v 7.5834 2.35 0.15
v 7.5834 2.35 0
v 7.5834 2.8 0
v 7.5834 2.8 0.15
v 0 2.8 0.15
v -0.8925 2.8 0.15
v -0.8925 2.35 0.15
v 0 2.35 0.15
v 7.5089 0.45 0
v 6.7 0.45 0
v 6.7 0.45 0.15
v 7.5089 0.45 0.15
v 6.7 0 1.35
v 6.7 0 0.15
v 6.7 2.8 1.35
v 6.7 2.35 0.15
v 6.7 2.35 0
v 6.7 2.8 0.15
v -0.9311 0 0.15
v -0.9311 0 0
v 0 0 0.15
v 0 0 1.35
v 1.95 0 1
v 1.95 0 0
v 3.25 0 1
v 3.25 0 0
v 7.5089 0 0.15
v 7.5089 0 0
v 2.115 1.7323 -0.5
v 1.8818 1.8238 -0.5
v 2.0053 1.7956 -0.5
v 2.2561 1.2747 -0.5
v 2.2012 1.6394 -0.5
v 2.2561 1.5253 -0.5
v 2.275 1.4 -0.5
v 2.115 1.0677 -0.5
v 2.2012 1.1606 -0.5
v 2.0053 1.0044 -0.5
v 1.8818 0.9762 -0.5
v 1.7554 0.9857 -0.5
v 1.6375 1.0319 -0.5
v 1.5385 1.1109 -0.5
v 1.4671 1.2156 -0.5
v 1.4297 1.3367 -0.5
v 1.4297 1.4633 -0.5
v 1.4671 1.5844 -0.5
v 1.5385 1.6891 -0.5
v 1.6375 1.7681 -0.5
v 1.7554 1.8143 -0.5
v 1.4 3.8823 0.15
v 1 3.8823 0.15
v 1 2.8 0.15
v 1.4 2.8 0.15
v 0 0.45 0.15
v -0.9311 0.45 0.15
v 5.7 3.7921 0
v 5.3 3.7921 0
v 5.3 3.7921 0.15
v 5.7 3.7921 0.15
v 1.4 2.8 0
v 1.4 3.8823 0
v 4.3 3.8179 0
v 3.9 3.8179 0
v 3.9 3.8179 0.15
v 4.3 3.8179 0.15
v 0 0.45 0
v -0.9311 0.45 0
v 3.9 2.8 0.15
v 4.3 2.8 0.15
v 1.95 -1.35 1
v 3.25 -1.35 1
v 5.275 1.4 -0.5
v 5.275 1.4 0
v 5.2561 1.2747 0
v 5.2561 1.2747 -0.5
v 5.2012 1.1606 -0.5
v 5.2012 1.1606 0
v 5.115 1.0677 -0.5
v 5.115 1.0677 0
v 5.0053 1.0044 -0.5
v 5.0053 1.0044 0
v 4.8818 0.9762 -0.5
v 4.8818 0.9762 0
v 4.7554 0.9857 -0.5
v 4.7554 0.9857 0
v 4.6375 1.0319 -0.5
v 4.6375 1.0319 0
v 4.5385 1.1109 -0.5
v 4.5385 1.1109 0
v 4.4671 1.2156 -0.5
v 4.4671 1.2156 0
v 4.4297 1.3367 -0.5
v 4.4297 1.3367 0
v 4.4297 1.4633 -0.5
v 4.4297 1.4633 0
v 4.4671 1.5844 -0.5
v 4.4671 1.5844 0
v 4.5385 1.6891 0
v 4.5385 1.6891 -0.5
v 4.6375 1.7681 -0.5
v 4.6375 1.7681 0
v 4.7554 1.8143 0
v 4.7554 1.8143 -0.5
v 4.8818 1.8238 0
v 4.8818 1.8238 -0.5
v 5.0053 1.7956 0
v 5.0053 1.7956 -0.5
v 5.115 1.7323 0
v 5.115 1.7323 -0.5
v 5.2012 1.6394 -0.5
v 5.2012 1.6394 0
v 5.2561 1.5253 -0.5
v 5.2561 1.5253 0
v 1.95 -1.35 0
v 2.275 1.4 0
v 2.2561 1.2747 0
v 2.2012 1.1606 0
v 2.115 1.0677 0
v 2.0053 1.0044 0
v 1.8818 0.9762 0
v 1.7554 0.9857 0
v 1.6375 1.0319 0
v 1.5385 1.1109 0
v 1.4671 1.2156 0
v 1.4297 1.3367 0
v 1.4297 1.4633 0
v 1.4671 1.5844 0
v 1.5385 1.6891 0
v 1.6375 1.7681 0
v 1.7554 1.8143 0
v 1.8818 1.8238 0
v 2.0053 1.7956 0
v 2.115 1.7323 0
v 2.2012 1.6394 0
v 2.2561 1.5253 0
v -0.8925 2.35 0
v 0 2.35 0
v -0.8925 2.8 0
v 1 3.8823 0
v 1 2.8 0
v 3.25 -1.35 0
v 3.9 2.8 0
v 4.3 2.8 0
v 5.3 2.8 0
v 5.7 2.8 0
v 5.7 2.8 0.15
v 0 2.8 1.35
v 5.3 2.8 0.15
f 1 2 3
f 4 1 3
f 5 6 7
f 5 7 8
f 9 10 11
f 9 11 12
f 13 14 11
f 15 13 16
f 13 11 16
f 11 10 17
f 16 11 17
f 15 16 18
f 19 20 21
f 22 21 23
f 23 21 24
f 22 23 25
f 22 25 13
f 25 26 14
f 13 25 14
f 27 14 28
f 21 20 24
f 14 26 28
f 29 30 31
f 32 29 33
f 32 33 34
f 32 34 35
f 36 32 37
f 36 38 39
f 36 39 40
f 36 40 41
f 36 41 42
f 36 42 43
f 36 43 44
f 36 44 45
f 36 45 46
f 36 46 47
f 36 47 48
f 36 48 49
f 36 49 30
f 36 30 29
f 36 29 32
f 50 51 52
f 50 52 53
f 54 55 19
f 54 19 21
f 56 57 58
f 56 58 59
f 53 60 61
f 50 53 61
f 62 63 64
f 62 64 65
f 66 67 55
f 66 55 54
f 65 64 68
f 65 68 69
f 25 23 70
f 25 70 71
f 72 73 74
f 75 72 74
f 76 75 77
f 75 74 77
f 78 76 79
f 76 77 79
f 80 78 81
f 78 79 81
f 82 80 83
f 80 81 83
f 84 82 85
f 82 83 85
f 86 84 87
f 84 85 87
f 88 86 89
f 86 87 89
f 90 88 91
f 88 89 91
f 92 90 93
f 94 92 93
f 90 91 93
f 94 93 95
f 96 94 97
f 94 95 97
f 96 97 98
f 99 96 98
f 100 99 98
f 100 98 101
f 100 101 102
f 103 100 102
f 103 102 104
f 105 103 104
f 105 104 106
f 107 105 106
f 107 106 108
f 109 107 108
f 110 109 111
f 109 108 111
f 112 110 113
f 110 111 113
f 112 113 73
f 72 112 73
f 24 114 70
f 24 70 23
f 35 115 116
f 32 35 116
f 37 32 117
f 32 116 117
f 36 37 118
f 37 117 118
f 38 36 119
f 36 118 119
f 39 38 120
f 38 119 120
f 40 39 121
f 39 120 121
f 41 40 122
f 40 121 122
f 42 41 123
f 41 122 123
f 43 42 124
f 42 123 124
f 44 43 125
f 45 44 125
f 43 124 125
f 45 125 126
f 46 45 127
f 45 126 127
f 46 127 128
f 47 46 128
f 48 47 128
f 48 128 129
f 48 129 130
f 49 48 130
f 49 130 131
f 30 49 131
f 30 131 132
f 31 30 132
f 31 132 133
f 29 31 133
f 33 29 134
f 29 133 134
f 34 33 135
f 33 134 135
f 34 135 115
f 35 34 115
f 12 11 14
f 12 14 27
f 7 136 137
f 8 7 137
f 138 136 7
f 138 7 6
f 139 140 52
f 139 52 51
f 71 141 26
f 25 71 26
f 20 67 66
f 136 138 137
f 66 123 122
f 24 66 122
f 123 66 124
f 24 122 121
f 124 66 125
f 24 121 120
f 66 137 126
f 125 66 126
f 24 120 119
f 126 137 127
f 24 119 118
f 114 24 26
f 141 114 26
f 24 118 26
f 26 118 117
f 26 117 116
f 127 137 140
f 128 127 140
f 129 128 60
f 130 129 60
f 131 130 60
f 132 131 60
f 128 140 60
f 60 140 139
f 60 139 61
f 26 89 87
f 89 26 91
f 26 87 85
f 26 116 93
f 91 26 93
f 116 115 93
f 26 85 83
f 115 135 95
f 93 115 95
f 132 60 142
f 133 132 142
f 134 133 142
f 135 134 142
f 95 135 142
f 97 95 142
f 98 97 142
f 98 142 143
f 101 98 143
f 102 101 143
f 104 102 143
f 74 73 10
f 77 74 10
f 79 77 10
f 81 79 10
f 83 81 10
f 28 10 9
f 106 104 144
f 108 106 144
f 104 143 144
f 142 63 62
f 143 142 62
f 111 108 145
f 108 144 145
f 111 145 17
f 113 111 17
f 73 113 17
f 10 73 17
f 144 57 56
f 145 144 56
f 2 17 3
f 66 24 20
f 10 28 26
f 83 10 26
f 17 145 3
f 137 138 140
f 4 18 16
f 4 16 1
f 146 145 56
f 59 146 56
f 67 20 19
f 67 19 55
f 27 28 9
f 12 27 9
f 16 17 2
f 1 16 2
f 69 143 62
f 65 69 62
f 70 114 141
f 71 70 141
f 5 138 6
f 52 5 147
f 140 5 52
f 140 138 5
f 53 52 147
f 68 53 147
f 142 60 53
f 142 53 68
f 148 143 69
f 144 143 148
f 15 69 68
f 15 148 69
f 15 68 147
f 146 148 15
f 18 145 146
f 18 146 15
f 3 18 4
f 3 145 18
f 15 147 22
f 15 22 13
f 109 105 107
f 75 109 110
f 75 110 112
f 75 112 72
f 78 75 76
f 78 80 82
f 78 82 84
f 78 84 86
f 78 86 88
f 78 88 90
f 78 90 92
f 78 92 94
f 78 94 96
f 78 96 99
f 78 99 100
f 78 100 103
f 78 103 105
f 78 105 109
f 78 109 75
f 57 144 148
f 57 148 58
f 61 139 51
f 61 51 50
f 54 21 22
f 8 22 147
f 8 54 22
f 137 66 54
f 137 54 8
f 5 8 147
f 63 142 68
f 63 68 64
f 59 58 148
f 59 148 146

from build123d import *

# Parameters (mm, degrees)
F0_W     = 6.7
F0_H     = 2.8
F1_DEPTH = 1.35
F2_W     = 0.4
F2_H     = 0.992101
F2_H_2   = 1.01787
F2_H_3   = 1.082292
F2_W_2   = 0.883373
F2_H_4   = 0.45
F2_W_3   = 0.808923
F2_W_4   = 0.892466
F2_W_5   = 0.931122
F3_DEPTH = 0.15
F4_W     = 1.3
F4_H     = 1.35
F5_DEPTH = 1
F6_R     = 0.425
F7_DEPTH = 0.5


with BuildPart() as f1:
    # F0 (on Top) → F1 (new body)
    with BuildSketch(Plane.XY):
        with Locations((3.35, 1.4)):
            Rectangle(F0_W, F0_H)
    extrude(amount=F1_DEPTH)

    # F2 (on Top) → F3 (join)
    with BuildSketch(Plane.XY):
        with Locations((5.5, 3.29605)):
            Rectangle(F2_W, F2_H)
        with Locations((4.1, 3.308935)):
            Rectangle(F2_W, F2_H_2)
        with Locations((1.2, 3.341146)):
            Rectangle(F2_W, F2_H_3)
        with Locations((7.141686, 2.575)):
            Rectangle(F2_W_2, F2_H_4)
        with Locations((7.104461, 0.225)):
            Rectangle(F2_W_3, F2_H_4)
        with Locations((-0.446233, 2.575)):
            Rectangle(F2_W_4, F2_H_4)
        with Locations((-0.465561, 0.225)):
            Rectangle(F2_W_5, F2_H_4)
    extrude(amount=F3_DEPTH)

    # F4 (on Top) → F5 (join)
    with BuildSketch(Plane.XY):
        with Locations((2.6, -0.675)):
            Rectangle(F4_W, F4_H)
    extrude(amount=F5_DEPTH)

    # F6 (on face) → F7 (join)
    with BuildSketch(Plane(origin=(0, 0, 0), x_dir=(1, 0, 0), z_dir=(0, 0, -1))):
        with Locations((4.85, -1.4)):
            Circle(F6_R)
        with Locations((1.85, -1.4)):
            Circle(F6_R)
    extrude(amount=F7_DEPTH)


solid = f1.part
